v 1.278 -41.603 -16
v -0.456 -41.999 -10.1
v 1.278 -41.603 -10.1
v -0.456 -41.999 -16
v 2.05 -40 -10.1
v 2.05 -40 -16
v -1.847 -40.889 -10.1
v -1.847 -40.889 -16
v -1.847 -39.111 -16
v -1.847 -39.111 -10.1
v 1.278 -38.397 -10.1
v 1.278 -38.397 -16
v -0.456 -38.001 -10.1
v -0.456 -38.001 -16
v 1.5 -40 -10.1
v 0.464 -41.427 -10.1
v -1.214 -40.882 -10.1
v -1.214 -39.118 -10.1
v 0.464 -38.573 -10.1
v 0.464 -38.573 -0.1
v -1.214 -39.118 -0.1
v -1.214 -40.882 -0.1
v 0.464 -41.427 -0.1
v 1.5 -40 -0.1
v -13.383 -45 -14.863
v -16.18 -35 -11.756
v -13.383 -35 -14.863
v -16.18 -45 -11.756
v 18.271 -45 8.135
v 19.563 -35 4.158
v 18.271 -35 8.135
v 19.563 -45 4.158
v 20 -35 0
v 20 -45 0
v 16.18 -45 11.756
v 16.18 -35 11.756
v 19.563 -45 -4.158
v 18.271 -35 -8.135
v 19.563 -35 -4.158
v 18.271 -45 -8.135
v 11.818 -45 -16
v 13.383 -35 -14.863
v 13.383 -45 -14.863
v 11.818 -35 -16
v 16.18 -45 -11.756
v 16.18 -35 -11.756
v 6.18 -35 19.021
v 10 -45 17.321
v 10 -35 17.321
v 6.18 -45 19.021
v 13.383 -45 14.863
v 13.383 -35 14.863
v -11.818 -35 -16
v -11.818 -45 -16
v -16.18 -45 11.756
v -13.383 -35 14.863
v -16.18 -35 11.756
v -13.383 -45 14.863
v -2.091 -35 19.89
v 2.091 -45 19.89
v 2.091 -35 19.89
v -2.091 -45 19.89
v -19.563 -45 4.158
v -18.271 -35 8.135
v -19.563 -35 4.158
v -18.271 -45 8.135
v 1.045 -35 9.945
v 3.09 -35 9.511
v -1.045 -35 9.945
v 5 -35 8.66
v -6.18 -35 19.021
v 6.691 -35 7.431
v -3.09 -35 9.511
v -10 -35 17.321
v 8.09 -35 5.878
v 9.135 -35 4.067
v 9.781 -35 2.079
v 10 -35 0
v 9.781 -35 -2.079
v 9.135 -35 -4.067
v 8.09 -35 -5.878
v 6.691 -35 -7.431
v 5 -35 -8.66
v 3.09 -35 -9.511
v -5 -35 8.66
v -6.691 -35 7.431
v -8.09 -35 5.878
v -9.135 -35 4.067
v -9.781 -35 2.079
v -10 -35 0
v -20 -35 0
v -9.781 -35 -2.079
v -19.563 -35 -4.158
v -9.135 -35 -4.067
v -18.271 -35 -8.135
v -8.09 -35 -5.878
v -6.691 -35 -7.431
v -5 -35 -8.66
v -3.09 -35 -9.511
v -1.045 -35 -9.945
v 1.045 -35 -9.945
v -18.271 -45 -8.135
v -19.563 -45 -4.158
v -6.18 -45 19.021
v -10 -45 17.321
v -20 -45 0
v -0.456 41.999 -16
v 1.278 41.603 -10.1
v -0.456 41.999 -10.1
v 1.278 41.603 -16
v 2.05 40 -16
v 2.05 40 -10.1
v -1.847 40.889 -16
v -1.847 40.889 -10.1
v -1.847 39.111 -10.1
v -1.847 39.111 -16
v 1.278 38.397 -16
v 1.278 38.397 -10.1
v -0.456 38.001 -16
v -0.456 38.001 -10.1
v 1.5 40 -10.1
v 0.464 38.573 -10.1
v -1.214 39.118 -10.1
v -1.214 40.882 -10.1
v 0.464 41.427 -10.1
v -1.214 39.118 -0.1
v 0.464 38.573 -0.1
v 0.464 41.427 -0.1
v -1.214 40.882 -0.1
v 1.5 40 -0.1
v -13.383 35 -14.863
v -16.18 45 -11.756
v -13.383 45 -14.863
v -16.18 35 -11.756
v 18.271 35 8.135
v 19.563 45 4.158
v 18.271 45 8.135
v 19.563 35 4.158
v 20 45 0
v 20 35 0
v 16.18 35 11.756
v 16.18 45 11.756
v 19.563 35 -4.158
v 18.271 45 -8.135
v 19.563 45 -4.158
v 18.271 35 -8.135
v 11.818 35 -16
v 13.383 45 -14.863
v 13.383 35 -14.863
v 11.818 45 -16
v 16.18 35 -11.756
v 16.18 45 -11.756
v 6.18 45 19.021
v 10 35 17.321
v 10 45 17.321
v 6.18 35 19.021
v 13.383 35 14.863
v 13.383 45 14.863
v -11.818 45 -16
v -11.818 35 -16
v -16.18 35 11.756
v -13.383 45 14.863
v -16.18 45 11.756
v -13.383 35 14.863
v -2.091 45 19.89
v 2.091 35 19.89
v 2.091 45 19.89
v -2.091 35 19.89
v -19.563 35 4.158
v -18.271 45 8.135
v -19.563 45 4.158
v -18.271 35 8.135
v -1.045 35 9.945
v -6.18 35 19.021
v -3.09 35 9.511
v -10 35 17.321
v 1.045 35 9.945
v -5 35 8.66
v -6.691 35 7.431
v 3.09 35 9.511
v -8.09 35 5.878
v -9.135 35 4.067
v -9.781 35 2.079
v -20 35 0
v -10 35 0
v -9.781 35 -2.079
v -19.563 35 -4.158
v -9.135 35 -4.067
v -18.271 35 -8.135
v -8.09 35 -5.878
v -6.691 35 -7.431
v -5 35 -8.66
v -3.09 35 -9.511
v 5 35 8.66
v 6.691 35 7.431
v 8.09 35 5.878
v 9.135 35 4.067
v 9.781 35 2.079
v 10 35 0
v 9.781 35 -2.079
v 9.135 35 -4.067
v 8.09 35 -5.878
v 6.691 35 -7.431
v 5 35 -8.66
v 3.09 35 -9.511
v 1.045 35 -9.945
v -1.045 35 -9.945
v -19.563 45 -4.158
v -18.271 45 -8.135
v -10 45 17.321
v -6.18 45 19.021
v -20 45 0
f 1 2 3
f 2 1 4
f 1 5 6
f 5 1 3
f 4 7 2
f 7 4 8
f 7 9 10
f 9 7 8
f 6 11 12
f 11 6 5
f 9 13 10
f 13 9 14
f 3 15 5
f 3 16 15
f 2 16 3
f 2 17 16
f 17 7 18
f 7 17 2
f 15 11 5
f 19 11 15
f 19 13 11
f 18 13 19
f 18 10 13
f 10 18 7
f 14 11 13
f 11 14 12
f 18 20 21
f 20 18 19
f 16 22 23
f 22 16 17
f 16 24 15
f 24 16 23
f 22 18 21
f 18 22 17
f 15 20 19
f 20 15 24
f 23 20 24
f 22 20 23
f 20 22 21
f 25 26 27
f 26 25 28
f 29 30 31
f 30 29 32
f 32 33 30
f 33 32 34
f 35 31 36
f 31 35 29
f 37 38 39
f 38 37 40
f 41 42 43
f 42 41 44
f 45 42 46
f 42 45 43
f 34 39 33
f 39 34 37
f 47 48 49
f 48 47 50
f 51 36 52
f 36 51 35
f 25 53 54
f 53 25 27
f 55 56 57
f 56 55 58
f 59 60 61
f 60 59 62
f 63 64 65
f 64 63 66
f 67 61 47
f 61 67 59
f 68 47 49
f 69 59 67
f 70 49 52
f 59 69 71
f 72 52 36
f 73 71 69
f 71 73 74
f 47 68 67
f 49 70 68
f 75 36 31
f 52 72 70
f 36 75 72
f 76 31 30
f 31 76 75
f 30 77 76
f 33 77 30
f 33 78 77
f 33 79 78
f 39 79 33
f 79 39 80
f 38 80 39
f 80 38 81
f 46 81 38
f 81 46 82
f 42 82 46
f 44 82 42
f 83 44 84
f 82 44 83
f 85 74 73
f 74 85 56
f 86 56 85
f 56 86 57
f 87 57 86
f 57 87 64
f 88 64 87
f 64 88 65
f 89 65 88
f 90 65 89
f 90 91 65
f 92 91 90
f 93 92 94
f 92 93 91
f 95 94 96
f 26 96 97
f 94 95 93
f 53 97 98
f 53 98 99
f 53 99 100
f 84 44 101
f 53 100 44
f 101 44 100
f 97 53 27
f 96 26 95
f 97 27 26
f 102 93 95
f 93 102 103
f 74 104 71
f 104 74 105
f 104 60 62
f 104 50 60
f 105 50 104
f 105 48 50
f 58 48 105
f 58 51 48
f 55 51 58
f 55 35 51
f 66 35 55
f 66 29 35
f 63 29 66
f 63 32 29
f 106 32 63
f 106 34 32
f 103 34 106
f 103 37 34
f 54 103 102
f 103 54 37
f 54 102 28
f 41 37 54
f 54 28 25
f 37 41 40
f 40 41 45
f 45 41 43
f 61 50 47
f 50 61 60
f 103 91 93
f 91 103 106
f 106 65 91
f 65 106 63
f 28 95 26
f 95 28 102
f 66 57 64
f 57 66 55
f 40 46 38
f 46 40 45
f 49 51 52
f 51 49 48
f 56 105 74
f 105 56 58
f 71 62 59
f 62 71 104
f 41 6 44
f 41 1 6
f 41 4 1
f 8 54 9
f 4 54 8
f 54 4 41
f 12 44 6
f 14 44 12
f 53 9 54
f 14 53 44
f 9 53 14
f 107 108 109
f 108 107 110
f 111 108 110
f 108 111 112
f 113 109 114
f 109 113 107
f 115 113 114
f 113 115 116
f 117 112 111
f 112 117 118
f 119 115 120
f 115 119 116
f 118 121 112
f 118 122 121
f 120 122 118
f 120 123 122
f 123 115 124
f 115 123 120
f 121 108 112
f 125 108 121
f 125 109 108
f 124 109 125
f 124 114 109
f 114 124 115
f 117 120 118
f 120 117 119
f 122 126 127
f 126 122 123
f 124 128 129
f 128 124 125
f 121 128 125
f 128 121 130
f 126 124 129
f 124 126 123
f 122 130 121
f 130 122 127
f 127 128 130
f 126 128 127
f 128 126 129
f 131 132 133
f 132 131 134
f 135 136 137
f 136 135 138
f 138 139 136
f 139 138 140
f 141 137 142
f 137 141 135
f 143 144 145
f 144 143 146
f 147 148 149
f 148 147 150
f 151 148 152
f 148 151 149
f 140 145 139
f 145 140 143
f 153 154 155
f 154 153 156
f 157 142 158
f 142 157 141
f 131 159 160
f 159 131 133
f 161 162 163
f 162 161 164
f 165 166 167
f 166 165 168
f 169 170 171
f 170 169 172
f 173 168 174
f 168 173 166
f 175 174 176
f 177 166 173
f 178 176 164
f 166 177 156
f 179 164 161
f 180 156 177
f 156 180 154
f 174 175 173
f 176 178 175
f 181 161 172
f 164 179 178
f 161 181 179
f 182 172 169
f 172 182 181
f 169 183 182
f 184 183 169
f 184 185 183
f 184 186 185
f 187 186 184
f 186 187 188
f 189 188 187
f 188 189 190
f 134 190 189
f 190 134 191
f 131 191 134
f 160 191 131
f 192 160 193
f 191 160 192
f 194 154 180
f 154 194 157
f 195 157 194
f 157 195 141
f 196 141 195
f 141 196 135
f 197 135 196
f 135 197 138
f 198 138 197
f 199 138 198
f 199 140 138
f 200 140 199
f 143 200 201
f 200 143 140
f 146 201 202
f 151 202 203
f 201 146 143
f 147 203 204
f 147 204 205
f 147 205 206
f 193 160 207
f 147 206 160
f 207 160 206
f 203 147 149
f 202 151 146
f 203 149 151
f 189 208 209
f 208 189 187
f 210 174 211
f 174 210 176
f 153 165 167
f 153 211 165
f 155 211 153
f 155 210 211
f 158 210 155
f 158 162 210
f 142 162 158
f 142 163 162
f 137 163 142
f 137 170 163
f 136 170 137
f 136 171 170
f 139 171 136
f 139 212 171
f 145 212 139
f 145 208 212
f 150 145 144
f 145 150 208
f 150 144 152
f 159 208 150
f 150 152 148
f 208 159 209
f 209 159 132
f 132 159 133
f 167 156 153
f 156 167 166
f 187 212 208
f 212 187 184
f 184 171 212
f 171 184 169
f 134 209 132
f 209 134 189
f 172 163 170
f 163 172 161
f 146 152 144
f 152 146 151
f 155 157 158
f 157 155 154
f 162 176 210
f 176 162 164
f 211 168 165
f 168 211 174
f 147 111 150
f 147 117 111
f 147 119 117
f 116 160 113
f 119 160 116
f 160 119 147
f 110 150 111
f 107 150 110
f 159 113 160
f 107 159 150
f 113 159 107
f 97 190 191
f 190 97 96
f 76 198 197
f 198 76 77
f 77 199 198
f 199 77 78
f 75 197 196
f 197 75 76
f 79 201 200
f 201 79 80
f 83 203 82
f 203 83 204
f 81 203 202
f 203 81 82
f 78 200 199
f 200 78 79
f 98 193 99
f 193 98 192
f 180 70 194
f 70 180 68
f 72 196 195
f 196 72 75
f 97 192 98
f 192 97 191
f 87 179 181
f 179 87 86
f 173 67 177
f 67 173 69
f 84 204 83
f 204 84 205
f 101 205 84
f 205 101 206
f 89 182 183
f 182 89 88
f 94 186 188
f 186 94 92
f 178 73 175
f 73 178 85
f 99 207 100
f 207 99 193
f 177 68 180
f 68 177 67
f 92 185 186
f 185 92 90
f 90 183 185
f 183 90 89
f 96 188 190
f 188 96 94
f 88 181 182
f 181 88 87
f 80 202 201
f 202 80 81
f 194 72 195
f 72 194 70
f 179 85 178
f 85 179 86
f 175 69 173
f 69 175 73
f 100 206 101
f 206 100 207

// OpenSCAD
inductor_h = 70;
inductor_r = 10;

endcap_h = 10;
endcap_r = 20;
endcap_flat_r = 16; // radius until the flat part
// heat insert
heat_insert_r = 4.1/2;
heat_insert_depth = 5.9;
heat_insert_thr_r = 3/2;

buffer = 10;

holder_h = inductor_h + endcap_h * 2;




rotate(a = 90,
       v = [1,0,0]){
       
group() {    
cylinder(h = inductor_h,
         r1 = inductor_r,
         r2 = inductor_r,
         center =true);
translate(v = [0,0,inductor_h/2 + endcap_h/2]){
    difference() {
    cylinder(h = endcap_h,
             r1 = endcap_r,
             r2 = endcap_r,
             center = true);
    // cut out
    mirror(v= [0, 1, 0]) {
        translate(v = [0,endcap_r-(endcap_r-endcap_flat_r)/2,0]){
            cube(size = [endcap_r*2,
                         endcap_r-endcap_flat_r,
                         endcap_h+buffer], 
                         center = true);
        }
    }
    // heat insert
    translate(v = [0,-endcap_flat_r+heat_insert_depth/2-buffer/2,0]) {
        rotate(a=90,v = [1,0,0]){
            group(){
            cylinder(h = heat_insert_depth+buffer,
                     r1 = heat_insert_r,
                     r2 = heat_insert_r,
                     center = true);
            translate(v = [0,0,-10]) {
                cylinder(h = heat_insert_depth+buffer,
                         r1 = heat_insert_thr_r,
                         r2 = heat_insert_thr_r,
                         center = true);
            } // end translate
            }// end group
        } // end rotate
    }// end translate
    // end heat insert
    } // end difference
} // end translate
mirror(v = [0,0,1]){
translate(v = [0,0,inductor_h/2 + endcap_h/2]){
    difference() {
    cylinder(h = endcap_h,
             r1 = endcap_r,
             r2 = endcap_r,
             center = true);
    // cut out
    mirror(v= [0, 1, 0]) {
        translate(v = [0,endcap_r-(endcap_r-endcap_flat_r)/2,0]){
            cube(size = [endcap_r*2,
                         endcap_r-endcap_flat_r,
                         endcap_h+buffer], 
                         center = true);
        }
    }
    // heat insert
    translate(v = [0,-endcap_flat_r+heat_insert_depth/2-buffer/2,0]) {
        rotate(a=90,v = [1,0,0]){
            group(){
            cylinder(h = heat_insert_depth+buffer,
                     r1 = heat_insert_r,
                     r2 = heat_insert_r,
                     center = true);
            translate(v = [0,0,-10]) {
                cylinder(h = heat_insert_depth+buffer,
                         r1 = heat_insert_thr_r,
                         r2 = heat_insert_thr_r,
                         center = true);
            } // end translate
            }// end group
        } // end rotate
    }// end translate
    // end heat insert
    } // end difference
} // end translate
} // end mirror
}// end group
}// end rotate
